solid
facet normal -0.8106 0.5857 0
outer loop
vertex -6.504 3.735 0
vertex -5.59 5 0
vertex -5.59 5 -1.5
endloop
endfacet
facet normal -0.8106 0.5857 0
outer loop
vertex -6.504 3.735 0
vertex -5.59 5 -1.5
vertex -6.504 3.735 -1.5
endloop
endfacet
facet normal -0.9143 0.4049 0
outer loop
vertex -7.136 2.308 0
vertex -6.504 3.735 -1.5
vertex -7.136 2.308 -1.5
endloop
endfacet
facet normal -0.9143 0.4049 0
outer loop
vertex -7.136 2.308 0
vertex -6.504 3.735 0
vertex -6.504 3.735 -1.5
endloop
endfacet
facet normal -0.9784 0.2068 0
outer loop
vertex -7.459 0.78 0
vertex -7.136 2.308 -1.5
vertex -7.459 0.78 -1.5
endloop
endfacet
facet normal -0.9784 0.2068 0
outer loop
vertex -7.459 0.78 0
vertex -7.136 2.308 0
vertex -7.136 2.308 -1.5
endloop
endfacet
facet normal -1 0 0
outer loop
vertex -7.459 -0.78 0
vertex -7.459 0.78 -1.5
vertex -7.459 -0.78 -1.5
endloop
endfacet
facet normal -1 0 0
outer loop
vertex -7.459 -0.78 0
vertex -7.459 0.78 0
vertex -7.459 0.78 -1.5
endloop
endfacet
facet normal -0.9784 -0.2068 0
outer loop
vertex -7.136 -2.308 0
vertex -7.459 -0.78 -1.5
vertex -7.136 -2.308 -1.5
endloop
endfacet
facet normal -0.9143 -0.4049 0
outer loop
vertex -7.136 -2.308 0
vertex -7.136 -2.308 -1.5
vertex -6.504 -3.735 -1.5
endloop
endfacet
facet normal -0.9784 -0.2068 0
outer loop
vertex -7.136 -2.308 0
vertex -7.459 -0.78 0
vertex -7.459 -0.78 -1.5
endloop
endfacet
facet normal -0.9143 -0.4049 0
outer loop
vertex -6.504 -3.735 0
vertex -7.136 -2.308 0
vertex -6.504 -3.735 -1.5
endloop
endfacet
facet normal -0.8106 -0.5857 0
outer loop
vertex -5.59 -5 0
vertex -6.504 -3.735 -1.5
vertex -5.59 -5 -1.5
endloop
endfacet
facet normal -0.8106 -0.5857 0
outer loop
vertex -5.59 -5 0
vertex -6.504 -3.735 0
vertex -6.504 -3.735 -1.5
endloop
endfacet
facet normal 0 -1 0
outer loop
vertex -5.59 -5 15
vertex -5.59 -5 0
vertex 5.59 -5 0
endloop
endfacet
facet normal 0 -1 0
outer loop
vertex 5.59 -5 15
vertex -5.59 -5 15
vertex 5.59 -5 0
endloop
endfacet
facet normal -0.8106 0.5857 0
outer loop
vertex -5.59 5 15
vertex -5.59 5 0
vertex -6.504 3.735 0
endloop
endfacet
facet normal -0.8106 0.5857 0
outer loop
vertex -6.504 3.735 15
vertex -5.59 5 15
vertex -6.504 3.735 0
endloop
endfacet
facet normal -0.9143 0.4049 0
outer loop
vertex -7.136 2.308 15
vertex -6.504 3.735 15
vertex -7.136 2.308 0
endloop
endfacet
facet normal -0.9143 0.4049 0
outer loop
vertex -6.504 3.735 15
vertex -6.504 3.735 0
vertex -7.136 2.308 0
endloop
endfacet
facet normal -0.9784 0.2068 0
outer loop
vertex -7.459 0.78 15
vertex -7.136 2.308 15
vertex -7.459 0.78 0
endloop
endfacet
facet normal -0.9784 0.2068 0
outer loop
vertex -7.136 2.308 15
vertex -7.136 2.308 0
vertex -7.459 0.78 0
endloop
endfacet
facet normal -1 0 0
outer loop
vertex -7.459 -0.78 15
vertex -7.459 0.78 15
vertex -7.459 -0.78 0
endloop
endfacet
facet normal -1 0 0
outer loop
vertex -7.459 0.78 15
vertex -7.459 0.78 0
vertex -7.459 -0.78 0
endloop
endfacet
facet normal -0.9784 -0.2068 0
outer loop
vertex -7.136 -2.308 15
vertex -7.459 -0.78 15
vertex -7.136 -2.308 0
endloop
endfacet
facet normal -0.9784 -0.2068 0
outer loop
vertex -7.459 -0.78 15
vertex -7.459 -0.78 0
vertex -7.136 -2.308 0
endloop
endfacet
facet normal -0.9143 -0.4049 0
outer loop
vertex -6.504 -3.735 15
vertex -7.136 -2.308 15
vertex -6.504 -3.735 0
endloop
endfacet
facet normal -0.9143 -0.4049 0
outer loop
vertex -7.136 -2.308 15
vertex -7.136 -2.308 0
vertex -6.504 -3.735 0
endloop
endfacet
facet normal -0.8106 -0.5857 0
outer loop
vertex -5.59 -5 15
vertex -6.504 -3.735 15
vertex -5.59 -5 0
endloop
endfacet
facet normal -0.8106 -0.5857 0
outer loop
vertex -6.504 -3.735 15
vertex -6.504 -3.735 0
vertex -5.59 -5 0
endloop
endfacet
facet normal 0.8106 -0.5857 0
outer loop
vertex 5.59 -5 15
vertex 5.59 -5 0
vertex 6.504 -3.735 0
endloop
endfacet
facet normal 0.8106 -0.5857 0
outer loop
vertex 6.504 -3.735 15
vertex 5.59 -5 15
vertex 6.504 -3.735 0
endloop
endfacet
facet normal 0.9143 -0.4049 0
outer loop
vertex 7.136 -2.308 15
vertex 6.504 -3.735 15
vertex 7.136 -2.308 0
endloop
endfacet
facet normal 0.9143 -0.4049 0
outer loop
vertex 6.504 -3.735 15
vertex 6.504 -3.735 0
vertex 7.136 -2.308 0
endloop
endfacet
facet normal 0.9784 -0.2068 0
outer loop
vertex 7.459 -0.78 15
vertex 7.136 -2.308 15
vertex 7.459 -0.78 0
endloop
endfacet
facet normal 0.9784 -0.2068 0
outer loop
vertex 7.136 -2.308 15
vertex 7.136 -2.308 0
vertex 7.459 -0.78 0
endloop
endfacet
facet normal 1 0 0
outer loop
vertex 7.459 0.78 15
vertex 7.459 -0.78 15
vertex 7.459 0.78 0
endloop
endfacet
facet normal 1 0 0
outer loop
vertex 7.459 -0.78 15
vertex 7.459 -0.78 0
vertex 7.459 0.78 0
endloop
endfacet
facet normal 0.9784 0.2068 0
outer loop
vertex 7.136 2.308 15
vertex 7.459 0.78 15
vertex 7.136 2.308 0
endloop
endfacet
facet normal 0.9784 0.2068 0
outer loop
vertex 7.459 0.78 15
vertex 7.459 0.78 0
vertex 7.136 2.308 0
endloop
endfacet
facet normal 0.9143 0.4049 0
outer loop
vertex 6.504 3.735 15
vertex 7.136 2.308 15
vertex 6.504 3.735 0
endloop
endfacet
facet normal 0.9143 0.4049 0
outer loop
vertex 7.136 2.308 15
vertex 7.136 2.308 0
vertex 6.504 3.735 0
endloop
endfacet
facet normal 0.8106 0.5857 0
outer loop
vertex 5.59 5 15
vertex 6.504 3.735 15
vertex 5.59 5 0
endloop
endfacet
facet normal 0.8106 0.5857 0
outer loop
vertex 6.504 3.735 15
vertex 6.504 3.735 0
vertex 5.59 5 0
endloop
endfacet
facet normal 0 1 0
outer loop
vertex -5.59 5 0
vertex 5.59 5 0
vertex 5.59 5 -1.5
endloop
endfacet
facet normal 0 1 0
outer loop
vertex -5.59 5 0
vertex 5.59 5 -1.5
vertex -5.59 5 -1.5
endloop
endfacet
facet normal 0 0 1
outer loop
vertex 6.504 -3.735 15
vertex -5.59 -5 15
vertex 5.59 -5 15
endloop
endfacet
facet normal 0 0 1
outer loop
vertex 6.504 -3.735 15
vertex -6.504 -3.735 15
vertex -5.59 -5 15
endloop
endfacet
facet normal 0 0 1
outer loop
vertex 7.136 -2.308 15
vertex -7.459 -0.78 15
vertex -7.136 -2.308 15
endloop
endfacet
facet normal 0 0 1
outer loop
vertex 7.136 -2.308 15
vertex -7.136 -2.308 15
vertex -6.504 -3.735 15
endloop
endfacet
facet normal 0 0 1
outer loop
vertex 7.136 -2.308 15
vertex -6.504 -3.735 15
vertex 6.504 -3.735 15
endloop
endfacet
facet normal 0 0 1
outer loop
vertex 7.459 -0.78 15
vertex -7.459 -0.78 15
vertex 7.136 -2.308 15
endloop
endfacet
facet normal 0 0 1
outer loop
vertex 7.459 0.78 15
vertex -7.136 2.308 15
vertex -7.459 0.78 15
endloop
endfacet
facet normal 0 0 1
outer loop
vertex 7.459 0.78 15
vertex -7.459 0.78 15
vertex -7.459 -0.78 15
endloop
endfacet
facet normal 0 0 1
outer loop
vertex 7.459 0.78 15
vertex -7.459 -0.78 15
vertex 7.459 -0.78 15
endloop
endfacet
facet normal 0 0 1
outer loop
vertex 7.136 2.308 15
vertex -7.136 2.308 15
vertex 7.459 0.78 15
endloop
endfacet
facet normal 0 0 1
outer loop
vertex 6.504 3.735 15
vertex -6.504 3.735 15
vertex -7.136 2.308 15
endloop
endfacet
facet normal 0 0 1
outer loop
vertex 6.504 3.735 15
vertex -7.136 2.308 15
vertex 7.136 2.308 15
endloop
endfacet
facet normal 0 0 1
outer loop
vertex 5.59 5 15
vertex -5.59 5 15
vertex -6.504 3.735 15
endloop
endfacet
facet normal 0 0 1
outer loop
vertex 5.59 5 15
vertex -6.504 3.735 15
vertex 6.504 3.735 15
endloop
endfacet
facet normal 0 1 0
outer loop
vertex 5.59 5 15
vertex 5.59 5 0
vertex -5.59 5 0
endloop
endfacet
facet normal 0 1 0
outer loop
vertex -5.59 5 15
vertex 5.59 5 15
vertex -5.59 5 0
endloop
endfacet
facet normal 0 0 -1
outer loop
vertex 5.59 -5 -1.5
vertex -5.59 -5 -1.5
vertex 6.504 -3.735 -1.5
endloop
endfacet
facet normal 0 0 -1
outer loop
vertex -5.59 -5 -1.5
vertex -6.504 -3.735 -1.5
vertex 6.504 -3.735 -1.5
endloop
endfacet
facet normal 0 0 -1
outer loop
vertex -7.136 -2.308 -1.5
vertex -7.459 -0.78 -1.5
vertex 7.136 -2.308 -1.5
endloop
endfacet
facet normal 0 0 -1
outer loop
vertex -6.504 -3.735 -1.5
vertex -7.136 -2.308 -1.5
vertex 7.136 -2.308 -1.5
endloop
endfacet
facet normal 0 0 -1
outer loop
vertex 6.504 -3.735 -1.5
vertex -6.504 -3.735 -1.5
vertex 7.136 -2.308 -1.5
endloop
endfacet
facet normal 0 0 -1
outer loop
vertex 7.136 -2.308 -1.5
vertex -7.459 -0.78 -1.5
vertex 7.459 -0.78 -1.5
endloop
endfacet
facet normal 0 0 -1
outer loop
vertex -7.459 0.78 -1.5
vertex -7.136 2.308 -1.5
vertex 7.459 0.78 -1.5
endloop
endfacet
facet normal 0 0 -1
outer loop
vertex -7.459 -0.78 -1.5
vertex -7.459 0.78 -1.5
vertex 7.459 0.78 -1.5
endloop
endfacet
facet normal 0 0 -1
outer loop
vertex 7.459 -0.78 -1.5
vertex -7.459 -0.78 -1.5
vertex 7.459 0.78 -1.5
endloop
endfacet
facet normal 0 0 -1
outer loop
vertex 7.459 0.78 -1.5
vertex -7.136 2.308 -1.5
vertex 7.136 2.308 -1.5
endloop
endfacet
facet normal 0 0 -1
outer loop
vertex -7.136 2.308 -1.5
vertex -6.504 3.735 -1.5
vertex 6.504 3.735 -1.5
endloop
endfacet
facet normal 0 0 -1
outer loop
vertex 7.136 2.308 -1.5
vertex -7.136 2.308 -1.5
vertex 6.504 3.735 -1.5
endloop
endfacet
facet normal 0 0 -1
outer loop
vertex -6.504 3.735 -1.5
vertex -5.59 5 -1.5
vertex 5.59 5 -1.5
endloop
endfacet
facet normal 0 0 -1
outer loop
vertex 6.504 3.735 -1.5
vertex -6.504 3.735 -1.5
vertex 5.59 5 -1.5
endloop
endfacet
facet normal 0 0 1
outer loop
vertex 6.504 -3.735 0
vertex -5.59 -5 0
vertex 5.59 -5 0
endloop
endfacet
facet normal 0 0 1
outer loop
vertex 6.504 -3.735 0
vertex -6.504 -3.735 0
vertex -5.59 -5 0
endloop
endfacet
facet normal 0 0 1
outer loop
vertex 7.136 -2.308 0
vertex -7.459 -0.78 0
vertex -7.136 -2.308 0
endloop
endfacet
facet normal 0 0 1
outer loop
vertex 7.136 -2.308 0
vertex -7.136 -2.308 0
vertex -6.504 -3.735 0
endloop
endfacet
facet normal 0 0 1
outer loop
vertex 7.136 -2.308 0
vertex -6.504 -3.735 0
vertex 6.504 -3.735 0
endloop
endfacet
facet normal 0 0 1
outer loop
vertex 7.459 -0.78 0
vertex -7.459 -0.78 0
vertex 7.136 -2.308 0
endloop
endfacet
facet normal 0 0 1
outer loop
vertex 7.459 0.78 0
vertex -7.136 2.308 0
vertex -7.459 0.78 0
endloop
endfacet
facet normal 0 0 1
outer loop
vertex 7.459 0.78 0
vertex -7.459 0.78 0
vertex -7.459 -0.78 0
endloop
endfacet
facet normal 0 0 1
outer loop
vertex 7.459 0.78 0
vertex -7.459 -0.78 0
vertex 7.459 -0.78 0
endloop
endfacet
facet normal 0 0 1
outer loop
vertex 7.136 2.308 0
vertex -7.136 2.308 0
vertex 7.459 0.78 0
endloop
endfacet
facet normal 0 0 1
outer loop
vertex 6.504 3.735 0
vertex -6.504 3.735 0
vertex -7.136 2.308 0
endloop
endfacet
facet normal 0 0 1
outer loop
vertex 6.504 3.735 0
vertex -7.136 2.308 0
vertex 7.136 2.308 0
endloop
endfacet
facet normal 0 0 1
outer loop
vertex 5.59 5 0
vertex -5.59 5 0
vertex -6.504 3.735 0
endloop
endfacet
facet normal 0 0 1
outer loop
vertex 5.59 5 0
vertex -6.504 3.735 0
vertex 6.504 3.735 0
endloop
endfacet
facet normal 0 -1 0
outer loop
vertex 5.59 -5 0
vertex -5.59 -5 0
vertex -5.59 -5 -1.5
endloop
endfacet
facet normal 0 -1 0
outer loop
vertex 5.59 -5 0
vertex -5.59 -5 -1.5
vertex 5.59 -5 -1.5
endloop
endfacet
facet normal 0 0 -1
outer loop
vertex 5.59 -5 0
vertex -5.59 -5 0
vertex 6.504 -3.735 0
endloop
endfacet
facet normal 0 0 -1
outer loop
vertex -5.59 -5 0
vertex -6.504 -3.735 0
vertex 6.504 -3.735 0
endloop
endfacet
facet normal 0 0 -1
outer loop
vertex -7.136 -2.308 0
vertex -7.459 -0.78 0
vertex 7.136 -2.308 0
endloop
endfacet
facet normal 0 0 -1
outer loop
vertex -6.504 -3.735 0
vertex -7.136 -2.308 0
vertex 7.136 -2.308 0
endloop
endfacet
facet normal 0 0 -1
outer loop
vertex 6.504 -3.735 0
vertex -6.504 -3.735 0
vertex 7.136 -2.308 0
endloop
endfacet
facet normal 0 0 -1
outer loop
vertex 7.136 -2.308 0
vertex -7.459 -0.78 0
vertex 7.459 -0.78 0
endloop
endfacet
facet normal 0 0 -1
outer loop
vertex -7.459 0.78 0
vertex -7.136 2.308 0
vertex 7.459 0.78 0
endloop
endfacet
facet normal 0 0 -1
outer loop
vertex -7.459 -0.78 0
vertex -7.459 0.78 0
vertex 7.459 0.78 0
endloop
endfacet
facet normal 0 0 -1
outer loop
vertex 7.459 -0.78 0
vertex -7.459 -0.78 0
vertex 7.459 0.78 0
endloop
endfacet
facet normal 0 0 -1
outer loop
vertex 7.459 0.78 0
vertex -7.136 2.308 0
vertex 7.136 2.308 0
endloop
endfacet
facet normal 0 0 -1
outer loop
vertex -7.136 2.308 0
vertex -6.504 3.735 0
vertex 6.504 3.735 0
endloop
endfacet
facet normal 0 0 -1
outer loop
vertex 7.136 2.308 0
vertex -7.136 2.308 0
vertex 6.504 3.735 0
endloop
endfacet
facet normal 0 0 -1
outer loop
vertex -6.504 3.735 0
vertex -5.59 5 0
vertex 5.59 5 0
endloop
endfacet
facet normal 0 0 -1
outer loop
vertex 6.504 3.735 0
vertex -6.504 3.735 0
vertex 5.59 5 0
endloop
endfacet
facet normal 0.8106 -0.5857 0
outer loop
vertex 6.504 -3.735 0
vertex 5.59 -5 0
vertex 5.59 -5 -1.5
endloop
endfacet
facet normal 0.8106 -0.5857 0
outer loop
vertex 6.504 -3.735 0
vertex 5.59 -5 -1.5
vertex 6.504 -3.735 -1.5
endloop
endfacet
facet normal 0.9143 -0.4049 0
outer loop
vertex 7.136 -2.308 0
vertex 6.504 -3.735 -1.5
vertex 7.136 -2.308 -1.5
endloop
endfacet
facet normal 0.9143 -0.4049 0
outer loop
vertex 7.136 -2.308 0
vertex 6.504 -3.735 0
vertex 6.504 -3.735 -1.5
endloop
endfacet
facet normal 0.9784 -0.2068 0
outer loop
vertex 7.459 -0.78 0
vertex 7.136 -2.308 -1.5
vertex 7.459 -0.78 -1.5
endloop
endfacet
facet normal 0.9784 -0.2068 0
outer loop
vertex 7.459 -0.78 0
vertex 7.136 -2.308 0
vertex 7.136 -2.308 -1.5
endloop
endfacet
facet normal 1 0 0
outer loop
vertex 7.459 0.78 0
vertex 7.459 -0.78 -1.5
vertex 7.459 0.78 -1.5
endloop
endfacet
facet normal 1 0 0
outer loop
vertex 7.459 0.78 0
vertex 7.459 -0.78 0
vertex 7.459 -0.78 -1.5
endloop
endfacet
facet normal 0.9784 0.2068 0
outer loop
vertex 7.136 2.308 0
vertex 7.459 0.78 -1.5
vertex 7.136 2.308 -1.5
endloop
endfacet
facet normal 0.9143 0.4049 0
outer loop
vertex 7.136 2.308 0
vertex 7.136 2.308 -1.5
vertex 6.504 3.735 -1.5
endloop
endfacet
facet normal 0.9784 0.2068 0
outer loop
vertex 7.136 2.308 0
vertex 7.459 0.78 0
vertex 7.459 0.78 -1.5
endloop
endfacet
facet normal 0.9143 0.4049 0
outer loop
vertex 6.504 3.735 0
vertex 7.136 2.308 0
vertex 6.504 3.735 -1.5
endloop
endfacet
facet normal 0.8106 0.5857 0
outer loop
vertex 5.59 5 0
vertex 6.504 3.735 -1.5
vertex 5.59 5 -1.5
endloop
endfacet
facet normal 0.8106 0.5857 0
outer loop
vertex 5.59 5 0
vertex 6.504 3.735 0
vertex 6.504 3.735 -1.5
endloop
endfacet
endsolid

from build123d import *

# Parameters (mm, degrees)
BOSS_EXTRUDE1_DEPTH = 15
BOSS_EXTRUDE2_DEPTH = 1.5


with BuildPart() as part:
    # Sketch1 → Boss-Extrude1 (new body)
    with BuildSketch(Plane.XY):
        with BuildLine():
            Line((-5.590169944, -5), (5.590169944, -5))
            ThreePointArc((5.590169944, -5), (7.5, 0), (5.590169944, 5))
            Line((5.590169944, 5), (-5.590169944, 5))
            ThreePointArc((-5.590169944, 5), (-7.5, 0), (-5.590169944, -5))
        make_face()
    extrude(amount=BOSS_EXTRUDE1_DEPTH)


with BuildPart() as body_2:
    # Sketch2 → Boss-Extrude2 (new body)
    with BuildSketch(Plane(origin=(0, 0, 0), x_dir=(-1, 0, 0), z_dir=(0, 0, -1))):
        with BuildLine():
            Line((5.590169944, -5), (-5.590169944, -5))
            ThreePointArc((-5.590169944, -5), (-7.5, 0), (-5.590169944, 5))
            Line((-5.590169944, 5), (5.590169944, 5))
            ThreePointArc((5.590169944, 5), (7.5, 0), (5.590169944, -5))
        make_face()
    extrude(amount=BOSS_EXTRUDE2_DEPTH)


solid = Compound([part.part, body_2.part])
